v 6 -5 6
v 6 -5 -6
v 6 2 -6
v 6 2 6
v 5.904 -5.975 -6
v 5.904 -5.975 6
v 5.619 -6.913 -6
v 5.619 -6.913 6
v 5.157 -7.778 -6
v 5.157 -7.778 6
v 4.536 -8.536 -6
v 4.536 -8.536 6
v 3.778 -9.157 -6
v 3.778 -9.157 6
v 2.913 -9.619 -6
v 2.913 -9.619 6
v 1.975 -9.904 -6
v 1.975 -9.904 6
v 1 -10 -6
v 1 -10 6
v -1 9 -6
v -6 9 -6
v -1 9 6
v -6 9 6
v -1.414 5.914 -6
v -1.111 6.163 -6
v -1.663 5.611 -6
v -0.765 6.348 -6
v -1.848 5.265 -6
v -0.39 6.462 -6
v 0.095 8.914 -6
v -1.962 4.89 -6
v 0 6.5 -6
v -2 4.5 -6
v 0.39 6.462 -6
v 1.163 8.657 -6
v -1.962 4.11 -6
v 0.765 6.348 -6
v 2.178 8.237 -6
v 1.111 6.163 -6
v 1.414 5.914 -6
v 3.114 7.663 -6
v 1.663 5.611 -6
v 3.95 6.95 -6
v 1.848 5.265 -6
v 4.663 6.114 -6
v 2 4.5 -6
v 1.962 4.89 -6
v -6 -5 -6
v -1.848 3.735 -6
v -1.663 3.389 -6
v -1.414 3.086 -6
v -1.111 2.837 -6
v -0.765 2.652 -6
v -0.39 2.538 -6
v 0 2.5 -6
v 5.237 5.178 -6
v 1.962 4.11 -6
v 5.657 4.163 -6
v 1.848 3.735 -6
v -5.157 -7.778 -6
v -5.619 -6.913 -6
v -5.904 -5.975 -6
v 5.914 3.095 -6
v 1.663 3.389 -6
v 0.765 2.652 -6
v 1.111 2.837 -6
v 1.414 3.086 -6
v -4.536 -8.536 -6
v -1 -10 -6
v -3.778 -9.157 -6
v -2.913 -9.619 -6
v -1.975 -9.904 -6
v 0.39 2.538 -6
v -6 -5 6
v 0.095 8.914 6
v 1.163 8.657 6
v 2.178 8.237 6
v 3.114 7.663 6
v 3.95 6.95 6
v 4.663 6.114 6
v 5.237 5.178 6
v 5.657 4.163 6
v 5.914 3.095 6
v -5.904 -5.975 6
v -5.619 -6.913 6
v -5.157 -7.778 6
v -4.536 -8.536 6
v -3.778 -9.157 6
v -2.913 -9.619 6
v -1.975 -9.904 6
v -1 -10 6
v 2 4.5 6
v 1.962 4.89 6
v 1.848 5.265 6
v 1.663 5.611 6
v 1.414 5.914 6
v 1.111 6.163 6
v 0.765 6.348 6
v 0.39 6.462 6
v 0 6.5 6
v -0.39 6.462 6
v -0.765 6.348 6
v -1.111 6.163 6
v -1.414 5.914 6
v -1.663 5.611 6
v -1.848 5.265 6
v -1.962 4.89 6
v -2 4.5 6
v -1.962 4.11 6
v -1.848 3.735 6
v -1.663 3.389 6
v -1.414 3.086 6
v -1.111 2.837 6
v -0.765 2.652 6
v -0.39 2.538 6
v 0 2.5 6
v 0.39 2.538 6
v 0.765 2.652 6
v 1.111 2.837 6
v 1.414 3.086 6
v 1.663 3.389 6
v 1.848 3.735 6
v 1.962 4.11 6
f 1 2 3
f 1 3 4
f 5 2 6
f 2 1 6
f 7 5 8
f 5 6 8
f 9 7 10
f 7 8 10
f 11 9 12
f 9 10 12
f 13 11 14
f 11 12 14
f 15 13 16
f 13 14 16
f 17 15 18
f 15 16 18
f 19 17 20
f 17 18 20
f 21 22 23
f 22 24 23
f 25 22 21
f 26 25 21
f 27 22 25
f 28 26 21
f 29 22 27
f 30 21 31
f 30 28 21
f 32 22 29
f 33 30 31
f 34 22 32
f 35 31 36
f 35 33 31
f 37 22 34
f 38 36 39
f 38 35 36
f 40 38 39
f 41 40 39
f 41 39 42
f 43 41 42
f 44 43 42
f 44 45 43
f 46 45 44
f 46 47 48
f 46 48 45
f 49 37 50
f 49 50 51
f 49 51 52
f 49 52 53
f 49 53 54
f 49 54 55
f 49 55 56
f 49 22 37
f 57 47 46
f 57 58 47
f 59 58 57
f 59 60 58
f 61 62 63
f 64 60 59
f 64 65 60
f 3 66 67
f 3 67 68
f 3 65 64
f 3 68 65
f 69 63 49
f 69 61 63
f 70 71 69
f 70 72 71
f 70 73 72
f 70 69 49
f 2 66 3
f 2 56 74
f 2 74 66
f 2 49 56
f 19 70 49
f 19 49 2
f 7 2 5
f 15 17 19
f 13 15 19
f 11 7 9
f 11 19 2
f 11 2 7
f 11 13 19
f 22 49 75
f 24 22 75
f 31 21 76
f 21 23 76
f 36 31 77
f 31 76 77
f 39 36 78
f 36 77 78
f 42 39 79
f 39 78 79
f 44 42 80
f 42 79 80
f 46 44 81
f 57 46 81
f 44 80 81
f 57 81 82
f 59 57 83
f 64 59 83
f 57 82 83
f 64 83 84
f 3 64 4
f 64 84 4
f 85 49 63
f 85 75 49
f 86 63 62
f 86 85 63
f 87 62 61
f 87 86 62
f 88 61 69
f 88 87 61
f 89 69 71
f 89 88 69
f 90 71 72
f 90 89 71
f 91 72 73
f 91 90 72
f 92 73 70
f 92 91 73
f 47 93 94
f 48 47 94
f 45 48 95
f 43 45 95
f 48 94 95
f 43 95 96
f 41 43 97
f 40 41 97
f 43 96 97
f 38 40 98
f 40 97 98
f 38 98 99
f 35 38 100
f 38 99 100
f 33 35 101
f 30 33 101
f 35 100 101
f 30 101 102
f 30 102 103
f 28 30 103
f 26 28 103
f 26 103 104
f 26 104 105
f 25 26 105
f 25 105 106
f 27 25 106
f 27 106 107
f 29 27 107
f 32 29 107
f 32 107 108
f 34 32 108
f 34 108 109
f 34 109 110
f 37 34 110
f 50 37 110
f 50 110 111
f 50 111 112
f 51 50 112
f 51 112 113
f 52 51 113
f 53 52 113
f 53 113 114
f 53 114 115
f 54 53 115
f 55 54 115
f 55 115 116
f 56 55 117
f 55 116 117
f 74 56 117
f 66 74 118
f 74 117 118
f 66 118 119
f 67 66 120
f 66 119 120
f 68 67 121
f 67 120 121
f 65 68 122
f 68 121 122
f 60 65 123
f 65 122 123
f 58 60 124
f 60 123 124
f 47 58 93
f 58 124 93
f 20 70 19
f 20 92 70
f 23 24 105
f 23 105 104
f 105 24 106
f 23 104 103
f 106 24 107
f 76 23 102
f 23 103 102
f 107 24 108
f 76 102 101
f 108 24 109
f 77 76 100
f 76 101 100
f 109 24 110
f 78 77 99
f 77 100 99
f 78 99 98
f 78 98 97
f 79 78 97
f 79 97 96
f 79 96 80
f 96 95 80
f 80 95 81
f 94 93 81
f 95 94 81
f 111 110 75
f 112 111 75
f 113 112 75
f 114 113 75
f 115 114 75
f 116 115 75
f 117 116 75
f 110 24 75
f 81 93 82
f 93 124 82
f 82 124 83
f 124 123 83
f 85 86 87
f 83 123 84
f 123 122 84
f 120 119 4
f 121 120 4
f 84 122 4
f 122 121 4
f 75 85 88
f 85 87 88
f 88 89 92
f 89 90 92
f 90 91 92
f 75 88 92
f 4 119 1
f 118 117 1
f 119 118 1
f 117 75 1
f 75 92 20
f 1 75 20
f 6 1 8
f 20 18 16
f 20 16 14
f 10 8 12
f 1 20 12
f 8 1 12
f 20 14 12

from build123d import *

# Parameters (mm, degrees)
F0_W     = 12
F0_H     = 12
F1_DEPTH = 10
F2_DEPTH = 9
F3_R     = 2
F4_DEPTH = 13
F5_R     = 7
F6_R     = 5


with BuildPart() as f1:
    # F0 (on Front) → F1 (new body)
    with BuildSketch(Plane.XZ):
        Rectangle(F0_W, F0_H)
    extrude(amount=F1_DEPTH)

    # F2 (add): a face of the model
    f2_faces = [f1.faces().sort_by_distance(p)[0] for p in [
        (0, 0, 0),
    ]]
    extrude(f2_faces, amount=F2_DEPTH)

    # F3 (on face) → F4 (cut)
    with BuildSketch(Plane.XY.offset(6)):
        with Locations((0, 4.5)):
            Circle(F3_R)
    extrude(amount=-F4_DEPTH, mode=Mode.SUBTRACT)

    # F5
    f5_edges = [f1.edges().sort_by_distance(p)[0] for p in [
        (6, 9, 0),
    ]]
    fillet(f5_edges, radius=F5_R)

    # F6
    f6_edges = [f1.edges().sort_by_distance(p)[0] for p in [
        (6, -10, 0),
        (-6, -10, 0),
    ]]
    fillet(f6_edges, radius=F6_R)


solid = f1.part
